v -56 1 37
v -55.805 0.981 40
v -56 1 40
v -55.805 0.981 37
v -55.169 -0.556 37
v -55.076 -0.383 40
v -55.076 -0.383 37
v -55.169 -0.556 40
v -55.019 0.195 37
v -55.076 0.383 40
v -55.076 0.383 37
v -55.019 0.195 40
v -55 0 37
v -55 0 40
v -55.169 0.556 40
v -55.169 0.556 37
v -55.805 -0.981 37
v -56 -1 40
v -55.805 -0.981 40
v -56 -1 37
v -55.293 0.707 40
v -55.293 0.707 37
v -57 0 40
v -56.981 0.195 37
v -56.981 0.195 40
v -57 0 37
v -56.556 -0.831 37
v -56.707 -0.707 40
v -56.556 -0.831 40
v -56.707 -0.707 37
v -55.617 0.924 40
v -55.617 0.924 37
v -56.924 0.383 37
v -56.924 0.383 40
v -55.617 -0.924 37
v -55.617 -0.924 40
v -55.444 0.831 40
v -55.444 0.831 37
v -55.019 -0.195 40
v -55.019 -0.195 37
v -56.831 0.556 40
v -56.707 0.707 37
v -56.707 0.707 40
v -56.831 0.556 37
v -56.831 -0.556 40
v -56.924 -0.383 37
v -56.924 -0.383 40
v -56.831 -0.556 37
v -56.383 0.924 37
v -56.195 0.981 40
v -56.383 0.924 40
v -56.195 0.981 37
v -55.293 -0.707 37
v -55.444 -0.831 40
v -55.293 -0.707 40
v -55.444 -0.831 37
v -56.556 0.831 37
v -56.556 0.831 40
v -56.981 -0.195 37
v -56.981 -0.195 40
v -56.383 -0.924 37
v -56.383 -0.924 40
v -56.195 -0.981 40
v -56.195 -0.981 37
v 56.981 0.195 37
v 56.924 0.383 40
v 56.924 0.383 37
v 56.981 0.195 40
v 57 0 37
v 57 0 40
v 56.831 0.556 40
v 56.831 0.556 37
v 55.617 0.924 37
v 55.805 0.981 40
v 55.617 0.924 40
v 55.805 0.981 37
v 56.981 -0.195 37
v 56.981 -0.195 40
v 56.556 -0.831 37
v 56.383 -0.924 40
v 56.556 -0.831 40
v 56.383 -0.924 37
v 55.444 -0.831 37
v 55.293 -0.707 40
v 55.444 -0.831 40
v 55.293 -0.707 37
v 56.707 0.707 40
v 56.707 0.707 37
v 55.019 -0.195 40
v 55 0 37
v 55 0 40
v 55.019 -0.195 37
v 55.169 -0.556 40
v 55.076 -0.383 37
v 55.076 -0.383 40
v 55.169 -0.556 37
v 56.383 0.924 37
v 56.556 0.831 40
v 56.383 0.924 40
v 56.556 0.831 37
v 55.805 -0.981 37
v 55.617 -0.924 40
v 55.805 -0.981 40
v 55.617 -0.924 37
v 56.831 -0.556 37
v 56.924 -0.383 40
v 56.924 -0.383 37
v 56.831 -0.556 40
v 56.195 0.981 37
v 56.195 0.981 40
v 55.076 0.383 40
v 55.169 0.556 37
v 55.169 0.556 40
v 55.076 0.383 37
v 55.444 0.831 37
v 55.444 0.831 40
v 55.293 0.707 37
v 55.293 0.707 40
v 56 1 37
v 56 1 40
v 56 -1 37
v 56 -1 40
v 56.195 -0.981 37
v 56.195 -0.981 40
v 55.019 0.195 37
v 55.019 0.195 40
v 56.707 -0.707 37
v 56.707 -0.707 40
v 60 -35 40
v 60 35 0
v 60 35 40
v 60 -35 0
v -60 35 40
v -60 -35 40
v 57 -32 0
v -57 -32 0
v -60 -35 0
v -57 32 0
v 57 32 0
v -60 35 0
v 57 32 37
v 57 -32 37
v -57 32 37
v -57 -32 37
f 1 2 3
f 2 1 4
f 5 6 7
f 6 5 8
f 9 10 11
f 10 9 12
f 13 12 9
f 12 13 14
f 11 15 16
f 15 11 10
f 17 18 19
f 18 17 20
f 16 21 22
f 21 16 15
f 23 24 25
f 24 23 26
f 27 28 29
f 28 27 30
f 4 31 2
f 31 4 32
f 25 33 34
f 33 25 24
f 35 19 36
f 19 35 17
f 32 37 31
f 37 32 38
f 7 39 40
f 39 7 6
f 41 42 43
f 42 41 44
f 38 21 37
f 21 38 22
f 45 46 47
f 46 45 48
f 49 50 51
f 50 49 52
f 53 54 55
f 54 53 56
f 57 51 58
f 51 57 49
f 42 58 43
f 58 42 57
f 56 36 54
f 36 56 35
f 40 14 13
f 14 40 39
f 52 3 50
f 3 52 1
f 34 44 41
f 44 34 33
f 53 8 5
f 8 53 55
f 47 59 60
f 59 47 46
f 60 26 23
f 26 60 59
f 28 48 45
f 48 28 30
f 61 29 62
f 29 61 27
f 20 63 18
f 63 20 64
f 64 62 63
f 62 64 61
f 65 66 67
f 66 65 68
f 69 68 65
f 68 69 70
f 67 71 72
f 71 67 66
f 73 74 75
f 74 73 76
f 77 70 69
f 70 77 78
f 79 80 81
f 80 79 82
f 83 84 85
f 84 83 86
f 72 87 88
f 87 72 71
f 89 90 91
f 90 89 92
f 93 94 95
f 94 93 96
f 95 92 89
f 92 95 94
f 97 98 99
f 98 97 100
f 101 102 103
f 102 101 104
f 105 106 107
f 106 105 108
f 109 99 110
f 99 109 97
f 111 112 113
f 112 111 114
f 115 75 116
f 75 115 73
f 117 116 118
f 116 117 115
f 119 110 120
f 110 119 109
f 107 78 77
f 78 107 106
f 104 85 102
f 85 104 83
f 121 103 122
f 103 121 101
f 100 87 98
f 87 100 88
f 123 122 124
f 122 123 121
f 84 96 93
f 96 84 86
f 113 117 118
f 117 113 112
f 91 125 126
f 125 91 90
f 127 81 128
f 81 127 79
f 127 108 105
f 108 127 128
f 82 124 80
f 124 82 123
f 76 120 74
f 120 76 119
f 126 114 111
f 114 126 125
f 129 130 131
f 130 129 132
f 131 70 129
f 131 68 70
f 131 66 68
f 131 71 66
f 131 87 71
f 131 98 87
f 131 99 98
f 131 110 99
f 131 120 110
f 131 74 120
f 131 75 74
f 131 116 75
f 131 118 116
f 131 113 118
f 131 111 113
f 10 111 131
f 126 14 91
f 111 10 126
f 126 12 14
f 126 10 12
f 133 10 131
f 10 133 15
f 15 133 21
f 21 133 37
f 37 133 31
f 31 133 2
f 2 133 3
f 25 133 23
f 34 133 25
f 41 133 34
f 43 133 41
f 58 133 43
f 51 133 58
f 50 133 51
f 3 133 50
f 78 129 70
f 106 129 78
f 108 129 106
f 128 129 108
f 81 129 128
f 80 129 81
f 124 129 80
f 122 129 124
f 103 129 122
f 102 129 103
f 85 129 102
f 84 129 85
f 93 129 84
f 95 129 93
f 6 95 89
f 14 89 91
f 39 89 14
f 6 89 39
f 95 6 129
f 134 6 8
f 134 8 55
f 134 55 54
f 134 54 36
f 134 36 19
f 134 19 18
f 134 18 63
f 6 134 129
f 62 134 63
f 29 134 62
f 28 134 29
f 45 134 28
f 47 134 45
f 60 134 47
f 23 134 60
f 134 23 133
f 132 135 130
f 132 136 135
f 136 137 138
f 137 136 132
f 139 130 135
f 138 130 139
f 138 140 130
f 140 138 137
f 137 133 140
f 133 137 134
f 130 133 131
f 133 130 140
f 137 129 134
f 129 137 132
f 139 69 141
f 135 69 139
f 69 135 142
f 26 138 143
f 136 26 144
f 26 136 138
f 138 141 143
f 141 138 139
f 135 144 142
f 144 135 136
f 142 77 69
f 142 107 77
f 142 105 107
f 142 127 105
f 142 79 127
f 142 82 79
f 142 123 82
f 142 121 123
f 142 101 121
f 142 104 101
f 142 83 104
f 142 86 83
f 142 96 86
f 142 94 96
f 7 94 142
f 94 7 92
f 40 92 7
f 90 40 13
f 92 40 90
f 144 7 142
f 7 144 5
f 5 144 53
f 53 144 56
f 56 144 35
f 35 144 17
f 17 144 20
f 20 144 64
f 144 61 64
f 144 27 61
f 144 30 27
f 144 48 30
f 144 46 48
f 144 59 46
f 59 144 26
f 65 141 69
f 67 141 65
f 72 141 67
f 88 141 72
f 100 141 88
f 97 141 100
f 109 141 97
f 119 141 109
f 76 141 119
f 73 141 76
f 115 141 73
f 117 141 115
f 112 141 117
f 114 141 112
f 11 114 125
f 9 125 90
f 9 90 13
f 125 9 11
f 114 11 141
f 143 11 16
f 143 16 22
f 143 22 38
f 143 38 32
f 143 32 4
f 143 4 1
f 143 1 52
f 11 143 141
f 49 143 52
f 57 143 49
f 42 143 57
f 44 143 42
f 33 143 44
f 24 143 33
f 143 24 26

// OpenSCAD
// Mini horizontal gel-electrophoresis buffer tank.
// Outer dimensions: 120mm (X) x 70mm (Y) x 40mm (Z).
// Wall thickness: 3mm. Floor thickness: 3mm.
// Internal platform: 60mm long (X), full width (Y), 10mm high above inner floor.
// Electrode holes: 2mm diameter, horizontal along X, at ends, y=0, z=30.

$fn = 64;

// Outer dimensions
X_OUT = 120;
Y_OUT = 70;
Z_OUT = 40;

// Thicknesses
wall_thick = 3;
floor_thick = 3;

// Derived inner dimensions
X_IN  = X_OUT - 2 * wall_thick;
Y_IN  = Y_OUT - 2 * wall_thick;
Z_IN  = Z_OUT - floor_thick; // Open top, so Z height is just Z_OUT

// Platform dimensions
plat_len = 60;
plat_w   = Y_IN;
plat_h   = 10; // Height above inner floor

// Electrode hole specs
hole_d   = 2;
hole_y   = 0;
hole_z   = 30;

// Build the tank body (hollow box with floor)
// We build the outer shell and subtract the inner void.
// The inner void is split by the platform.

difference() {
    // 1. The solid outer block
    translate([-X_OUT/2, -Y_OUT/2, 0]) 
        cube([X_OUT, Y_OUT, Z_OUT]);

    // 2. The inner void (everything inside the walls)
    // We define the void as a union of two parts: the bottom chamber and the top chamber.
    // Bottom chamber: From z=0 to z=plat_h.
    // Top chamber: From z=plat_h to z=Z_IN.
    
    // Bottom void part (under the platform)
    translate([-X_IN/2, -Y_IN/2, 0]) 
        cube([X_IN, Y_IN, plat_h]);

    // Top void part (above the platform)
    translate([-X_IN/2, -Y_IN/2, plat_h]) 
        cube([X_IN, Y_IN, Z_IN - plat_h]);

    // 3. The platform itself (solid block inside the void)
    // Positioned at X = 0, Y = -Y_IN/2 to Y_IN/2, Z = plat_h to plat_h + plat_h
    translate([-plat_len/2, -plat_w/2, plat_h]) 
        cube([plat_len, plat_w, plat_h]);

    // 4. Electrode holes
    // Two holes, one at each end (X = +/- X_IN/2), centered in Y (y=0), at z=hole_z.
    // The hole is a cylinder along the X axis.
    for (x_pos = [-1, 1]) {
        translate([x_pos * (X_IN/2 - hole_d/2), hole_y, hole_z]) 
            cylinder(h = X_IN, d = hole_d, $fn = 32);
    }
}
